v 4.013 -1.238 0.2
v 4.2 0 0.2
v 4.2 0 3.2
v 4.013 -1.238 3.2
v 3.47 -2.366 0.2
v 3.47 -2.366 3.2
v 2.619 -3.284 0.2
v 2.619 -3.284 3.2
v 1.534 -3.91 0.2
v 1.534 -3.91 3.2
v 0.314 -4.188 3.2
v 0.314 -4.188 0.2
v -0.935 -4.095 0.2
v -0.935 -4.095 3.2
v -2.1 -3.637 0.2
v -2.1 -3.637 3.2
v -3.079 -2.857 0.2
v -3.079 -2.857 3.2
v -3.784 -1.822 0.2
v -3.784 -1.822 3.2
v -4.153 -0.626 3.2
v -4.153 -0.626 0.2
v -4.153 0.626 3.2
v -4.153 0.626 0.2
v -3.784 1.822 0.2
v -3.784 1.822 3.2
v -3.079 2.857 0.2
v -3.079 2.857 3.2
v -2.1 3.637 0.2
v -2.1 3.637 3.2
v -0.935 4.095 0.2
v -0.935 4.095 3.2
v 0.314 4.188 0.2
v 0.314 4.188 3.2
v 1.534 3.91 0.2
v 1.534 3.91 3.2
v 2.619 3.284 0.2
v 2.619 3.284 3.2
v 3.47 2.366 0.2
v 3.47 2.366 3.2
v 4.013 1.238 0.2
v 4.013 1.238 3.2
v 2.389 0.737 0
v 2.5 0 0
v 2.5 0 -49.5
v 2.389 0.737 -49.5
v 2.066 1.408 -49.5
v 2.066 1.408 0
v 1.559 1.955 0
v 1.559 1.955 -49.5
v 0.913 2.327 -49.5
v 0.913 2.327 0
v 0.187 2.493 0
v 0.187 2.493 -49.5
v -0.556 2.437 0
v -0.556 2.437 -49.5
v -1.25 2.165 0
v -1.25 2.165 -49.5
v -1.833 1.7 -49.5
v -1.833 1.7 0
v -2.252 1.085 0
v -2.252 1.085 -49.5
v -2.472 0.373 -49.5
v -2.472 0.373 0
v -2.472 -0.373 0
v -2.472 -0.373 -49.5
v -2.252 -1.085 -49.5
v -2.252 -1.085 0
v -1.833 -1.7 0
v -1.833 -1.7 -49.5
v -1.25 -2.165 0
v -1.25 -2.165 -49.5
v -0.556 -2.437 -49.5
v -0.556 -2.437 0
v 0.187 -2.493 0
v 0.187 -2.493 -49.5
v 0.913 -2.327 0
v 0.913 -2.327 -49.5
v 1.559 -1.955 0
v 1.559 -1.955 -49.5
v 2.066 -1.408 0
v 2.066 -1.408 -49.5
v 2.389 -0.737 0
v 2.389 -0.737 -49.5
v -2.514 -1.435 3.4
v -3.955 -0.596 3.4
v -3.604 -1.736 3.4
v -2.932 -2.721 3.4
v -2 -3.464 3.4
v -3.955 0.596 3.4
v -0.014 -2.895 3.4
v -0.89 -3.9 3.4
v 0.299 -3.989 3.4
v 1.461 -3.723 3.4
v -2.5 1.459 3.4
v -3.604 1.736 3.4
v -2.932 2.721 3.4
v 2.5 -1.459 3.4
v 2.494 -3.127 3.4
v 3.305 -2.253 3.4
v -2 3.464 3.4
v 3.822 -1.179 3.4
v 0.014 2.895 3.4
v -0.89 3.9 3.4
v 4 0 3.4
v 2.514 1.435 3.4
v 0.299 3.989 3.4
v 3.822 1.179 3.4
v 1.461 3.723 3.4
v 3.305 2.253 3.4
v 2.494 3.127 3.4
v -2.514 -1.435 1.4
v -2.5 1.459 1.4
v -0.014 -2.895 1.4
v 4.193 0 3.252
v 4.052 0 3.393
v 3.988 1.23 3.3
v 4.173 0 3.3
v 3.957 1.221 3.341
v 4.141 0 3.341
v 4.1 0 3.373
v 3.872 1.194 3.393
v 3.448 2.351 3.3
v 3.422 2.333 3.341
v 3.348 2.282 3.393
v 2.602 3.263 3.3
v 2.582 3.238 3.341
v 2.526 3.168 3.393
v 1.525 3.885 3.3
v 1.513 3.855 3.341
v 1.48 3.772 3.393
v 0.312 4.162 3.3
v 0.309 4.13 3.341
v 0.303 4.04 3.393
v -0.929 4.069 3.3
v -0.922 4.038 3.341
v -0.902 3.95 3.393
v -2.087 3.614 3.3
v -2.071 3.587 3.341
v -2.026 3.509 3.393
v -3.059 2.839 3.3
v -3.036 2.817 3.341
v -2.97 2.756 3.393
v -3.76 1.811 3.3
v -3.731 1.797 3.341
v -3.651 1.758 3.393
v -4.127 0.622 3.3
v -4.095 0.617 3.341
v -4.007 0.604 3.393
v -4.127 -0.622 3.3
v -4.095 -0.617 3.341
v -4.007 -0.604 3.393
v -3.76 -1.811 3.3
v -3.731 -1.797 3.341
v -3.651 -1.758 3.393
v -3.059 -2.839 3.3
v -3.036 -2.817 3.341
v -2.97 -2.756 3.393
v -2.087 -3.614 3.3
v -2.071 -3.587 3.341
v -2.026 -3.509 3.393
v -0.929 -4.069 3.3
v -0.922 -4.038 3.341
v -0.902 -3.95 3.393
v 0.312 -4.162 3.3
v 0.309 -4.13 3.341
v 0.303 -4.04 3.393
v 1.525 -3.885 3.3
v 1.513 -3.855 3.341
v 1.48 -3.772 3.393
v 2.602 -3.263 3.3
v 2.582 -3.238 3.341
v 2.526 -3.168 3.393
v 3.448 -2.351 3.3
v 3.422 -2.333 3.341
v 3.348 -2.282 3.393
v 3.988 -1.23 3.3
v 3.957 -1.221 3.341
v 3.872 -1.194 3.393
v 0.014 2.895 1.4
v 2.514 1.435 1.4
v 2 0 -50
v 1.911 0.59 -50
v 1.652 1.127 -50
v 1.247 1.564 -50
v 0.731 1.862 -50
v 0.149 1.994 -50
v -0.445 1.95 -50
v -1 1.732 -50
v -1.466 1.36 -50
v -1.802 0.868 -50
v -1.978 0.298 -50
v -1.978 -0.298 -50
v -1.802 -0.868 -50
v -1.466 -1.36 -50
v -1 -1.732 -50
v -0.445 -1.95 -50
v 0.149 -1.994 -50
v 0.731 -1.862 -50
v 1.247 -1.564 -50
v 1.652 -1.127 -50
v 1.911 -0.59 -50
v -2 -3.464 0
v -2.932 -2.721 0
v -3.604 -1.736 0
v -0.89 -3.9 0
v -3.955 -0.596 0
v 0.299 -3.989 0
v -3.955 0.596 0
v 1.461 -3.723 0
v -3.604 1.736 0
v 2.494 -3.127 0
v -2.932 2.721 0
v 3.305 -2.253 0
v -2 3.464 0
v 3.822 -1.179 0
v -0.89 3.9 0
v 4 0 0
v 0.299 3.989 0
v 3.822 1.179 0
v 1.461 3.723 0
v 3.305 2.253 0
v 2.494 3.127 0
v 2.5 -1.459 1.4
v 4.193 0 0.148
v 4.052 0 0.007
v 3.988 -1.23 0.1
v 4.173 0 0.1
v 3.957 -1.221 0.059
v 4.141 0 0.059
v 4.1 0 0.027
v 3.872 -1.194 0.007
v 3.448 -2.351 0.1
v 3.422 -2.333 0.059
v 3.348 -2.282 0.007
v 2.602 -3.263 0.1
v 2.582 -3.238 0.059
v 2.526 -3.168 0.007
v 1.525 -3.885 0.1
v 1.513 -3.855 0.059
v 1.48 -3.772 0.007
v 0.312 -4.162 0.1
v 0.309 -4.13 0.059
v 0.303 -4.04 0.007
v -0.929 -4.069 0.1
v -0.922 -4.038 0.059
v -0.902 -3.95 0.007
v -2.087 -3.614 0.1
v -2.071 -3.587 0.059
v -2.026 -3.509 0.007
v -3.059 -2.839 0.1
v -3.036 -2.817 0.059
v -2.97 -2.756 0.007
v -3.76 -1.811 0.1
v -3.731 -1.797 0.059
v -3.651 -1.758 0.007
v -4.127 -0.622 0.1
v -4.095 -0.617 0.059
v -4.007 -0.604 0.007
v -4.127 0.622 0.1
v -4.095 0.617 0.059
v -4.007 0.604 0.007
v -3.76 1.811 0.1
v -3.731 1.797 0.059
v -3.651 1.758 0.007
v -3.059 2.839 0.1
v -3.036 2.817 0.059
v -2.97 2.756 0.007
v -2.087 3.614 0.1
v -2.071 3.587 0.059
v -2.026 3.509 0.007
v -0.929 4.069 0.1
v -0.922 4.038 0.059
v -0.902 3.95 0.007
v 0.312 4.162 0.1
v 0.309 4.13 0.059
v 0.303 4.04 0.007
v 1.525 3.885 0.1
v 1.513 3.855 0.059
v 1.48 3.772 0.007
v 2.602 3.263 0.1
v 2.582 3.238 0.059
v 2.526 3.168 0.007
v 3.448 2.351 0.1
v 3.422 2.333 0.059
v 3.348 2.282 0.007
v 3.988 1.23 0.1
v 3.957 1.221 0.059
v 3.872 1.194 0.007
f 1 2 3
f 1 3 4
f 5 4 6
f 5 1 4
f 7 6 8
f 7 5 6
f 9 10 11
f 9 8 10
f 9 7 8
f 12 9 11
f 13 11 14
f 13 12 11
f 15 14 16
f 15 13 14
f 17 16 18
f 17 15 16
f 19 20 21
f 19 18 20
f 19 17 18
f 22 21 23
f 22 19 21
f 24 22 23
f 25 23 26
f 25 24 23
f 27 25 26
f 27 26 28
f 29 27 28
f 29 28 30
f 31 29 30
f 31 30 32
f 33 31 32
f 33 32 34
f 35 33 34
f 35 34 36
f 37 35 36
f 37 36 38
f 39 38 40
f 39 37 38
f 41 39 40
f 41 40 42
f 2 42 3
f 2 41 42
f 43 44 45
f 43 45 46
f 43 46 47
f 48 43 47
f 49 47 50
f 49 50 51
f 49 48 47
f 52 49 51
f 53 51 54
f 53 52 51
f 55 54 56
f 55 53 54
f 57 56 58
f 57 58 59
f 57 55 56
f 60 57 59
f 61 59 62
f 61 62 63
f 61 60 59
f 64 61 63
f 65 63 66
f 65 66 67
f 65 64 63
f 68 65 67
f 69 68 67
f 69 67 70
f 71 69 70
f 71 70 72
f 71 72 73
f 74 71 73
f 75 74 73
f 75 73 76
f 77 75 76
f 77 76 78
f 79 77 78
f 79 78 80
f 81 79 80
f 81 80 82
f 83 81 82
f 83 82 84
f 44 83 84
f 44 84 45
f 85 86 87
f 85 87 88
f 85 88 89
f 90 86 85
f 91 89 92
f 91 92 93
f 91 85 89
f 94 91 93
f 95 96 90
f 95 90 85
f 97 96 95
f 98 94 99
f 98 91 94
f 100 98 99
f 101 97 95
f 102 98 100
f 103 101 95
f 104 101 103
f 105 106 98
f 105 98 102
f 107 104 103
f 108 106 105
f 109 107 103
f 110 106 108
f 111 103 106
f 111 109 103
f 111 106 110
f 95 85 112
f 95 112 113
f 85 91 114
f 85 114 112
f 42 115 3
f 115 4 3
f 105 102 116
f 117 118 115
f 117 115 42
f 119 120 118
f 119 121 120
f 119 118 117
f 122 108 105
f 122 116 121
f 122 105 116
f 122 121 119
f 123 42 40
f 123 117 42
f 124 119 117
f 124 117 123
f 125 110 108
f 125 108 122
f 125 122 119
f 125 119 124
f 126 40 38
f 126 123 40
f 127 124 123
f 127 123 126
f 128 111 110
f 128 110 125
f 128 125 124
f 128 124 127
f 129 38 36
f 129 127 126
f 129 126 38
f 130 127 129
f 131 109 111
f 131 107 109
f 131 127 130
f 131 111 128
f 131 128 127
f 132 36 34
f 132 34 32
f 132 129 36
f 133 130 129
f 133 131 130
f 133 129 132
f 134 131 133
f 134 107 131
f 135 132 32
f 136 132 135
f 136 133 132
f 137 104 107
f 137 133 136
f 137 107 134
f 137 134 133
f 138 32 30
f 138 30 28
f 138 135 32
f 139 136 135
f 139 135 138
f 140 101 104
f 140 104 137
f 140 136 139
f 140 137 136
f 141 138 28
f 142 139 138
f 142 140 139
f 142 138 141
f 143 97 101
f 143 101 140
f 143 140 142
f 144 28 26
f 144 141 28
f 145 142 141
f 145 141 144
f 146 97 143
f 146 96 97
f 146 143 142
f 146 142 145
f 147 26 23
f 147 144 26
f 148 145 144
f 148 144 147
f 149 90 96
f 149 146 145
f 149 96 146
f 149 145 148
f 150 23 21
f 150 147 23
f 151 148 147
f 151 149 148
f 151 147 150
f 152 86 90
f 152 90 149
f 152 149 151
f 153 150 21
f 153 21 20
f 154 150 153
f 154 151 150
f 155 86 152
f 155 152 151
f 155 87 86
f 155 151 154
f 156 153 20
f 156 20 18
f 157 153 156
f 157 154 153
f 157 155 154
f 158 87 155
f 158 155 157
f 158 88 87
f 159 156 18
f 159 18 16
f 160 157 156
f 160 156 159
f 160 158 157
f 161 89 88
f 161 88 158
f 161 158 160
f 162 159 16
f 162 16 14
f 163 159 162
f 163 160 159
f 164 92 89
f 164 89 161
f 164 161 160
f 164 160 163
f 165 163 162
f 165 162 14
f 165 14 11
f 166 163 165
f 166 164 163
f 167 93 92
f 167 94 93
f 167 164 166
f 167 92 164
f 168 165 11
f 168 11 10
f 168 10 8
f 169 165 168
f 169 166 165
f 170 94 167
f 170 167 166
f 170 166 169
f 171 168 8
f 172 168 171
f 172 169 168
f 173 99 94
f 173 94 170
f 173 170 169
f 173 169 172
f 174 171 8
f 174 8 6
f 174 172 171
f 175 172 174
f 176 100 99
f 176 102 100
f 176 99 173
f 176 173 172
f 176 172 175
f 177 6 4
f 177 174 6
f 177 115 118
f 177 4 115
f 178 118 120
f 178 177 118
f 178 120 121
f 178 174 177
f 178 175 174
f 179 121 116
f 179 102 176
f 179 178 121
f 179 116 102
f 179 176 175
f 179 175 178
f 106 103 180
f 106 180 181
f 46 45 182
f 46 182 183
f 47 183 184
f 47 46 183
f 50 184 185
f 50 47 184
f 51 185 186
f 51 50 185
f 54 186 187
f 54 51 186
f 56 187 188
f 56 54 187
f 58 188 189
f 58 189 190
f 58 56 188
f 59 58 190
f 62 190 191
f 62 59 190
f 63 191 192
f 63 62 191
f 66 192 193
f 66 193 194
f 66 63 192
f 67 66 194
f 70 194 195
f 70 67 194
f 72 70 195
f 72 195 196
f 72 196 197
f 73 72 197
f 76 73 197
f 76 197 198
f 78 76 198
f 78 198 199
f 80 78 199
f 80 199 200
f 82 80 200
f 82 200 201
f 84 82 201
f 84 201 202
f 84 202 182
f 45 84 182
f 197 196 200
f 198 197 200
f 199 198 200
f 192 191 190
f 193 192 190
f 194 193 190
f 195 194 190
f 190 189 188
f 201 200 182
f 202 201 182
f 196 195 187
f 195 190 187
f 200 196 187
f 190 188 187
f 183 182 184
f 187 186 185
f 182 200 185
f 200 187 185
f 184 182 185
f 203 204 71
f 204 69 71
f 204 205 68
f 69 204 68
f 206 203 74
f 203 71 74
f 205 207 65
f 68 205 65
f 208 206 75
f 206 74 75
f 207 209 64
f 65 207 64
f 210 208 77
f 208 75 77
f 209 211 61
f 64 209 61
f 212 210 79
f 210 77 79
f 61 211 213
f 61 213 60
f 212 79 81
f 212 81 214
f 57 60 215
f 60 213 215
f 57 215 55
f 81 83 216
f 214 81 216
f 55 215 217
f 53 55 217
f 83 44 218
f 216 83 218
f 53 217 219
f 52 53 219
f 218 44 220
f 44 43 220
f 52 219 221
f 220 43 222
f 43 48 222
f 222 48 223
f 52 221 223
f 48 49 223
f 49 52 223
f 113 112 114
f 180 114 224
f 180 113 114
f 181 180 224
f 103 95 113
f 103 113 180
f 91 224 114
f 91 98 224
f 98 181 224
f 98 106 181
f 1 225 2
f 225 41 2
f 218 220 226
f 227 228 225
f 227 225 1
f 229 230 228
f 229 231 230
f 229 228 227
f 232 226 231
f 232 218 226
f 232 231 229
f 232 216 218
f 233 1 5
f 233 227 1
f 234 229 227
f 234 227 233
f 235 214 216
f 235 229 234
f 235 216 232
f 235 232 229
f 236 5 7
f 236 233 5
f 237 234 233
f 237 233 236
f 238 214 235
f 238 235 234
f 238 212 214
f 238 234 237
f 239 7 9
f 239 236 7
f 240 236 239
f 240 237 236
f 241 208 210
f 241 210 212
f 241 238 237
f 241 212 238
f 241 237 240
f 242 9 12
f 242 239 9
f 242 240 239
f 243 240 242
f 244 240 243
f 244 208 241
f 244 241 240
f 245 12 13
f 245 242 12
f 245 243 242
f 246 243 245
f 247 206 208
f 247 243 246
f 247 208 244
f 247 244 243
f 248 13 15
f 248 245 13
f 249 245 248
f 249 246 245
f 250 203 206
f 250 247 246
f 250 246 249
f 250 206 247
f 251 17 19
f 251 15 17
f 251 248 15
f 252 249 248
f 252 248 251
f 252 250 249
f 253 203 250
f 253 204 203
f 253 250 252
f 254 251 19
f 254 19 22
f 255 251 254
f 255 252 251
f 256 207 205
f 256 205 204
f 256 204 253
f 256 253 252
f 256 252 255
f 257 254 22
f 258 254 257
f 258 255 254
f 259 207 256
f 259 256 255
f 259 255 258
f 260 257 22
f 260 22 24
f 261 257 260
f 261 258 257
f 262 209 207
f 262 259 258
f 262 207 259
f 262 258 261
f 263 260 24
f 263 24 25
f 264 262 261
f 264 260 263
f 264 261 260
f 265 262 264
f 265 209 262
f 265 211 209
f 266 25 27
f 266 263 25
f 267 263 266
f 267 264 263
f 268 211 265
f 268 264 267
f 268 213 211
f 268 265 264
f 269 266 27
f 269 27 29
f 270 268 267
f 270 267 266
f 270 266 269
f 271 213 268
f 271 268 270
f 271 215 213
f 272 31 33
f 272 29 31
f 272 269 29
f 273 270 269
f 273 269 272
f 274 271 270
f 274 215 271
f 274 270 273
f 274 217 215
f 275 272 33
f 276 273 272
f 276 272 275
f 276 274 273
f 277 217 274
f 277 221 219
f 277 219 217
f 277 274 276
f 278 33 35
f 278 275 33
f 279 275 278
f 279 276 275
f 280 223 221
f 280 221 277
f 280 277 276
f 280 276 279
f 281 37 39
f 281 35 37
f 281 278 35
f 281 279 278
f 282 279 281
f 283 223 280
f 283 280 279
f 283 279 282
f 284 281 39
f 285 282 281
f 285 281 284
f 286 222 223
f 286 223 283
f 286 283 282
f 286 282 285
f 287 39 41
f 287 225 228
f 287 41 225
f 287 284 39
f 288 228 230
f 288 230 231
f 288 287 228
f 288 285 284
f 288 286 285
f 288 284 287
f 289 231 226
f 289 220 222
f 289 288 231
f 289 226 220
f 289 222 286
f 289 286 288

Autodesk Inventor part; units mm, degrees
ref_plane "YZ Plane" through (0, 0, 0) normal (1, 0, 0) x (0, 1, 0)
ref_plane "XZ Plane" through (0, 0, 0) normal (0, 1, 0) x (-1, 0, 0)
ref_plane "XY Plane" through (0, 0, 0) normal (0, 0, 1) x (1, 0, 0)
sketch "Sketch1" plane through (0, 0, 0) normal (0, 0, 1) x (1, 0, 0)
  circle A0 centre (0, 0) radius 4.2
  circle A1 centre (0, 0) radius 2.5
  dimension "d0" = 8.4
  dimension "d3" = 5
extrude "Extrusion1" add sketch "Sketch1" along normal blind 3.4 contours A0 | A1
extrude "Extrusion2" add sketch "Sketch1" against normal blind 50 contours A1
thread "Thread1" size "M5x0.8" class "6g" standard "ANSI Metric M Profile" length 17.5
fillet "Fillet1" radius 0.2 2 edges at (-4.2, 0, 3.4) (-4.2, 0, 0)
chamfer "Chamfer1" distance 0.5 angle 45 1 edges at (-2.5, 0, -50)
sketch "Sketch2" plane through (0, 0, 3.4) normal (0, 0, 1) x (1, 0, 0)
  line L0 (-2.5, 1.4593) -> (0.0138, 2.8947)
  line L1 (0.0138, 2.8947) -> (2.5138, 1.4354)
  line L2 (2.5138, 1.4354) -> (2.5, -1.4593)
  line L3 (2.5, -1.4593) -> (-0.0138, -2.8947)
  line L4 (-0.0138, -2.8947) -> (-2.5138, -1.4354)
  line L5 (-2.5138, -1.4354) -> (-2.5, 1.4593)
  point P0 (0, 0)
  point P1 (0, 0)
extrude "Extrusion3" cut sketch "Sketch2" against normal blind 2
properties part number "COTS_GENERIC_M5x50_Screw" material "Steel, Carbon"
